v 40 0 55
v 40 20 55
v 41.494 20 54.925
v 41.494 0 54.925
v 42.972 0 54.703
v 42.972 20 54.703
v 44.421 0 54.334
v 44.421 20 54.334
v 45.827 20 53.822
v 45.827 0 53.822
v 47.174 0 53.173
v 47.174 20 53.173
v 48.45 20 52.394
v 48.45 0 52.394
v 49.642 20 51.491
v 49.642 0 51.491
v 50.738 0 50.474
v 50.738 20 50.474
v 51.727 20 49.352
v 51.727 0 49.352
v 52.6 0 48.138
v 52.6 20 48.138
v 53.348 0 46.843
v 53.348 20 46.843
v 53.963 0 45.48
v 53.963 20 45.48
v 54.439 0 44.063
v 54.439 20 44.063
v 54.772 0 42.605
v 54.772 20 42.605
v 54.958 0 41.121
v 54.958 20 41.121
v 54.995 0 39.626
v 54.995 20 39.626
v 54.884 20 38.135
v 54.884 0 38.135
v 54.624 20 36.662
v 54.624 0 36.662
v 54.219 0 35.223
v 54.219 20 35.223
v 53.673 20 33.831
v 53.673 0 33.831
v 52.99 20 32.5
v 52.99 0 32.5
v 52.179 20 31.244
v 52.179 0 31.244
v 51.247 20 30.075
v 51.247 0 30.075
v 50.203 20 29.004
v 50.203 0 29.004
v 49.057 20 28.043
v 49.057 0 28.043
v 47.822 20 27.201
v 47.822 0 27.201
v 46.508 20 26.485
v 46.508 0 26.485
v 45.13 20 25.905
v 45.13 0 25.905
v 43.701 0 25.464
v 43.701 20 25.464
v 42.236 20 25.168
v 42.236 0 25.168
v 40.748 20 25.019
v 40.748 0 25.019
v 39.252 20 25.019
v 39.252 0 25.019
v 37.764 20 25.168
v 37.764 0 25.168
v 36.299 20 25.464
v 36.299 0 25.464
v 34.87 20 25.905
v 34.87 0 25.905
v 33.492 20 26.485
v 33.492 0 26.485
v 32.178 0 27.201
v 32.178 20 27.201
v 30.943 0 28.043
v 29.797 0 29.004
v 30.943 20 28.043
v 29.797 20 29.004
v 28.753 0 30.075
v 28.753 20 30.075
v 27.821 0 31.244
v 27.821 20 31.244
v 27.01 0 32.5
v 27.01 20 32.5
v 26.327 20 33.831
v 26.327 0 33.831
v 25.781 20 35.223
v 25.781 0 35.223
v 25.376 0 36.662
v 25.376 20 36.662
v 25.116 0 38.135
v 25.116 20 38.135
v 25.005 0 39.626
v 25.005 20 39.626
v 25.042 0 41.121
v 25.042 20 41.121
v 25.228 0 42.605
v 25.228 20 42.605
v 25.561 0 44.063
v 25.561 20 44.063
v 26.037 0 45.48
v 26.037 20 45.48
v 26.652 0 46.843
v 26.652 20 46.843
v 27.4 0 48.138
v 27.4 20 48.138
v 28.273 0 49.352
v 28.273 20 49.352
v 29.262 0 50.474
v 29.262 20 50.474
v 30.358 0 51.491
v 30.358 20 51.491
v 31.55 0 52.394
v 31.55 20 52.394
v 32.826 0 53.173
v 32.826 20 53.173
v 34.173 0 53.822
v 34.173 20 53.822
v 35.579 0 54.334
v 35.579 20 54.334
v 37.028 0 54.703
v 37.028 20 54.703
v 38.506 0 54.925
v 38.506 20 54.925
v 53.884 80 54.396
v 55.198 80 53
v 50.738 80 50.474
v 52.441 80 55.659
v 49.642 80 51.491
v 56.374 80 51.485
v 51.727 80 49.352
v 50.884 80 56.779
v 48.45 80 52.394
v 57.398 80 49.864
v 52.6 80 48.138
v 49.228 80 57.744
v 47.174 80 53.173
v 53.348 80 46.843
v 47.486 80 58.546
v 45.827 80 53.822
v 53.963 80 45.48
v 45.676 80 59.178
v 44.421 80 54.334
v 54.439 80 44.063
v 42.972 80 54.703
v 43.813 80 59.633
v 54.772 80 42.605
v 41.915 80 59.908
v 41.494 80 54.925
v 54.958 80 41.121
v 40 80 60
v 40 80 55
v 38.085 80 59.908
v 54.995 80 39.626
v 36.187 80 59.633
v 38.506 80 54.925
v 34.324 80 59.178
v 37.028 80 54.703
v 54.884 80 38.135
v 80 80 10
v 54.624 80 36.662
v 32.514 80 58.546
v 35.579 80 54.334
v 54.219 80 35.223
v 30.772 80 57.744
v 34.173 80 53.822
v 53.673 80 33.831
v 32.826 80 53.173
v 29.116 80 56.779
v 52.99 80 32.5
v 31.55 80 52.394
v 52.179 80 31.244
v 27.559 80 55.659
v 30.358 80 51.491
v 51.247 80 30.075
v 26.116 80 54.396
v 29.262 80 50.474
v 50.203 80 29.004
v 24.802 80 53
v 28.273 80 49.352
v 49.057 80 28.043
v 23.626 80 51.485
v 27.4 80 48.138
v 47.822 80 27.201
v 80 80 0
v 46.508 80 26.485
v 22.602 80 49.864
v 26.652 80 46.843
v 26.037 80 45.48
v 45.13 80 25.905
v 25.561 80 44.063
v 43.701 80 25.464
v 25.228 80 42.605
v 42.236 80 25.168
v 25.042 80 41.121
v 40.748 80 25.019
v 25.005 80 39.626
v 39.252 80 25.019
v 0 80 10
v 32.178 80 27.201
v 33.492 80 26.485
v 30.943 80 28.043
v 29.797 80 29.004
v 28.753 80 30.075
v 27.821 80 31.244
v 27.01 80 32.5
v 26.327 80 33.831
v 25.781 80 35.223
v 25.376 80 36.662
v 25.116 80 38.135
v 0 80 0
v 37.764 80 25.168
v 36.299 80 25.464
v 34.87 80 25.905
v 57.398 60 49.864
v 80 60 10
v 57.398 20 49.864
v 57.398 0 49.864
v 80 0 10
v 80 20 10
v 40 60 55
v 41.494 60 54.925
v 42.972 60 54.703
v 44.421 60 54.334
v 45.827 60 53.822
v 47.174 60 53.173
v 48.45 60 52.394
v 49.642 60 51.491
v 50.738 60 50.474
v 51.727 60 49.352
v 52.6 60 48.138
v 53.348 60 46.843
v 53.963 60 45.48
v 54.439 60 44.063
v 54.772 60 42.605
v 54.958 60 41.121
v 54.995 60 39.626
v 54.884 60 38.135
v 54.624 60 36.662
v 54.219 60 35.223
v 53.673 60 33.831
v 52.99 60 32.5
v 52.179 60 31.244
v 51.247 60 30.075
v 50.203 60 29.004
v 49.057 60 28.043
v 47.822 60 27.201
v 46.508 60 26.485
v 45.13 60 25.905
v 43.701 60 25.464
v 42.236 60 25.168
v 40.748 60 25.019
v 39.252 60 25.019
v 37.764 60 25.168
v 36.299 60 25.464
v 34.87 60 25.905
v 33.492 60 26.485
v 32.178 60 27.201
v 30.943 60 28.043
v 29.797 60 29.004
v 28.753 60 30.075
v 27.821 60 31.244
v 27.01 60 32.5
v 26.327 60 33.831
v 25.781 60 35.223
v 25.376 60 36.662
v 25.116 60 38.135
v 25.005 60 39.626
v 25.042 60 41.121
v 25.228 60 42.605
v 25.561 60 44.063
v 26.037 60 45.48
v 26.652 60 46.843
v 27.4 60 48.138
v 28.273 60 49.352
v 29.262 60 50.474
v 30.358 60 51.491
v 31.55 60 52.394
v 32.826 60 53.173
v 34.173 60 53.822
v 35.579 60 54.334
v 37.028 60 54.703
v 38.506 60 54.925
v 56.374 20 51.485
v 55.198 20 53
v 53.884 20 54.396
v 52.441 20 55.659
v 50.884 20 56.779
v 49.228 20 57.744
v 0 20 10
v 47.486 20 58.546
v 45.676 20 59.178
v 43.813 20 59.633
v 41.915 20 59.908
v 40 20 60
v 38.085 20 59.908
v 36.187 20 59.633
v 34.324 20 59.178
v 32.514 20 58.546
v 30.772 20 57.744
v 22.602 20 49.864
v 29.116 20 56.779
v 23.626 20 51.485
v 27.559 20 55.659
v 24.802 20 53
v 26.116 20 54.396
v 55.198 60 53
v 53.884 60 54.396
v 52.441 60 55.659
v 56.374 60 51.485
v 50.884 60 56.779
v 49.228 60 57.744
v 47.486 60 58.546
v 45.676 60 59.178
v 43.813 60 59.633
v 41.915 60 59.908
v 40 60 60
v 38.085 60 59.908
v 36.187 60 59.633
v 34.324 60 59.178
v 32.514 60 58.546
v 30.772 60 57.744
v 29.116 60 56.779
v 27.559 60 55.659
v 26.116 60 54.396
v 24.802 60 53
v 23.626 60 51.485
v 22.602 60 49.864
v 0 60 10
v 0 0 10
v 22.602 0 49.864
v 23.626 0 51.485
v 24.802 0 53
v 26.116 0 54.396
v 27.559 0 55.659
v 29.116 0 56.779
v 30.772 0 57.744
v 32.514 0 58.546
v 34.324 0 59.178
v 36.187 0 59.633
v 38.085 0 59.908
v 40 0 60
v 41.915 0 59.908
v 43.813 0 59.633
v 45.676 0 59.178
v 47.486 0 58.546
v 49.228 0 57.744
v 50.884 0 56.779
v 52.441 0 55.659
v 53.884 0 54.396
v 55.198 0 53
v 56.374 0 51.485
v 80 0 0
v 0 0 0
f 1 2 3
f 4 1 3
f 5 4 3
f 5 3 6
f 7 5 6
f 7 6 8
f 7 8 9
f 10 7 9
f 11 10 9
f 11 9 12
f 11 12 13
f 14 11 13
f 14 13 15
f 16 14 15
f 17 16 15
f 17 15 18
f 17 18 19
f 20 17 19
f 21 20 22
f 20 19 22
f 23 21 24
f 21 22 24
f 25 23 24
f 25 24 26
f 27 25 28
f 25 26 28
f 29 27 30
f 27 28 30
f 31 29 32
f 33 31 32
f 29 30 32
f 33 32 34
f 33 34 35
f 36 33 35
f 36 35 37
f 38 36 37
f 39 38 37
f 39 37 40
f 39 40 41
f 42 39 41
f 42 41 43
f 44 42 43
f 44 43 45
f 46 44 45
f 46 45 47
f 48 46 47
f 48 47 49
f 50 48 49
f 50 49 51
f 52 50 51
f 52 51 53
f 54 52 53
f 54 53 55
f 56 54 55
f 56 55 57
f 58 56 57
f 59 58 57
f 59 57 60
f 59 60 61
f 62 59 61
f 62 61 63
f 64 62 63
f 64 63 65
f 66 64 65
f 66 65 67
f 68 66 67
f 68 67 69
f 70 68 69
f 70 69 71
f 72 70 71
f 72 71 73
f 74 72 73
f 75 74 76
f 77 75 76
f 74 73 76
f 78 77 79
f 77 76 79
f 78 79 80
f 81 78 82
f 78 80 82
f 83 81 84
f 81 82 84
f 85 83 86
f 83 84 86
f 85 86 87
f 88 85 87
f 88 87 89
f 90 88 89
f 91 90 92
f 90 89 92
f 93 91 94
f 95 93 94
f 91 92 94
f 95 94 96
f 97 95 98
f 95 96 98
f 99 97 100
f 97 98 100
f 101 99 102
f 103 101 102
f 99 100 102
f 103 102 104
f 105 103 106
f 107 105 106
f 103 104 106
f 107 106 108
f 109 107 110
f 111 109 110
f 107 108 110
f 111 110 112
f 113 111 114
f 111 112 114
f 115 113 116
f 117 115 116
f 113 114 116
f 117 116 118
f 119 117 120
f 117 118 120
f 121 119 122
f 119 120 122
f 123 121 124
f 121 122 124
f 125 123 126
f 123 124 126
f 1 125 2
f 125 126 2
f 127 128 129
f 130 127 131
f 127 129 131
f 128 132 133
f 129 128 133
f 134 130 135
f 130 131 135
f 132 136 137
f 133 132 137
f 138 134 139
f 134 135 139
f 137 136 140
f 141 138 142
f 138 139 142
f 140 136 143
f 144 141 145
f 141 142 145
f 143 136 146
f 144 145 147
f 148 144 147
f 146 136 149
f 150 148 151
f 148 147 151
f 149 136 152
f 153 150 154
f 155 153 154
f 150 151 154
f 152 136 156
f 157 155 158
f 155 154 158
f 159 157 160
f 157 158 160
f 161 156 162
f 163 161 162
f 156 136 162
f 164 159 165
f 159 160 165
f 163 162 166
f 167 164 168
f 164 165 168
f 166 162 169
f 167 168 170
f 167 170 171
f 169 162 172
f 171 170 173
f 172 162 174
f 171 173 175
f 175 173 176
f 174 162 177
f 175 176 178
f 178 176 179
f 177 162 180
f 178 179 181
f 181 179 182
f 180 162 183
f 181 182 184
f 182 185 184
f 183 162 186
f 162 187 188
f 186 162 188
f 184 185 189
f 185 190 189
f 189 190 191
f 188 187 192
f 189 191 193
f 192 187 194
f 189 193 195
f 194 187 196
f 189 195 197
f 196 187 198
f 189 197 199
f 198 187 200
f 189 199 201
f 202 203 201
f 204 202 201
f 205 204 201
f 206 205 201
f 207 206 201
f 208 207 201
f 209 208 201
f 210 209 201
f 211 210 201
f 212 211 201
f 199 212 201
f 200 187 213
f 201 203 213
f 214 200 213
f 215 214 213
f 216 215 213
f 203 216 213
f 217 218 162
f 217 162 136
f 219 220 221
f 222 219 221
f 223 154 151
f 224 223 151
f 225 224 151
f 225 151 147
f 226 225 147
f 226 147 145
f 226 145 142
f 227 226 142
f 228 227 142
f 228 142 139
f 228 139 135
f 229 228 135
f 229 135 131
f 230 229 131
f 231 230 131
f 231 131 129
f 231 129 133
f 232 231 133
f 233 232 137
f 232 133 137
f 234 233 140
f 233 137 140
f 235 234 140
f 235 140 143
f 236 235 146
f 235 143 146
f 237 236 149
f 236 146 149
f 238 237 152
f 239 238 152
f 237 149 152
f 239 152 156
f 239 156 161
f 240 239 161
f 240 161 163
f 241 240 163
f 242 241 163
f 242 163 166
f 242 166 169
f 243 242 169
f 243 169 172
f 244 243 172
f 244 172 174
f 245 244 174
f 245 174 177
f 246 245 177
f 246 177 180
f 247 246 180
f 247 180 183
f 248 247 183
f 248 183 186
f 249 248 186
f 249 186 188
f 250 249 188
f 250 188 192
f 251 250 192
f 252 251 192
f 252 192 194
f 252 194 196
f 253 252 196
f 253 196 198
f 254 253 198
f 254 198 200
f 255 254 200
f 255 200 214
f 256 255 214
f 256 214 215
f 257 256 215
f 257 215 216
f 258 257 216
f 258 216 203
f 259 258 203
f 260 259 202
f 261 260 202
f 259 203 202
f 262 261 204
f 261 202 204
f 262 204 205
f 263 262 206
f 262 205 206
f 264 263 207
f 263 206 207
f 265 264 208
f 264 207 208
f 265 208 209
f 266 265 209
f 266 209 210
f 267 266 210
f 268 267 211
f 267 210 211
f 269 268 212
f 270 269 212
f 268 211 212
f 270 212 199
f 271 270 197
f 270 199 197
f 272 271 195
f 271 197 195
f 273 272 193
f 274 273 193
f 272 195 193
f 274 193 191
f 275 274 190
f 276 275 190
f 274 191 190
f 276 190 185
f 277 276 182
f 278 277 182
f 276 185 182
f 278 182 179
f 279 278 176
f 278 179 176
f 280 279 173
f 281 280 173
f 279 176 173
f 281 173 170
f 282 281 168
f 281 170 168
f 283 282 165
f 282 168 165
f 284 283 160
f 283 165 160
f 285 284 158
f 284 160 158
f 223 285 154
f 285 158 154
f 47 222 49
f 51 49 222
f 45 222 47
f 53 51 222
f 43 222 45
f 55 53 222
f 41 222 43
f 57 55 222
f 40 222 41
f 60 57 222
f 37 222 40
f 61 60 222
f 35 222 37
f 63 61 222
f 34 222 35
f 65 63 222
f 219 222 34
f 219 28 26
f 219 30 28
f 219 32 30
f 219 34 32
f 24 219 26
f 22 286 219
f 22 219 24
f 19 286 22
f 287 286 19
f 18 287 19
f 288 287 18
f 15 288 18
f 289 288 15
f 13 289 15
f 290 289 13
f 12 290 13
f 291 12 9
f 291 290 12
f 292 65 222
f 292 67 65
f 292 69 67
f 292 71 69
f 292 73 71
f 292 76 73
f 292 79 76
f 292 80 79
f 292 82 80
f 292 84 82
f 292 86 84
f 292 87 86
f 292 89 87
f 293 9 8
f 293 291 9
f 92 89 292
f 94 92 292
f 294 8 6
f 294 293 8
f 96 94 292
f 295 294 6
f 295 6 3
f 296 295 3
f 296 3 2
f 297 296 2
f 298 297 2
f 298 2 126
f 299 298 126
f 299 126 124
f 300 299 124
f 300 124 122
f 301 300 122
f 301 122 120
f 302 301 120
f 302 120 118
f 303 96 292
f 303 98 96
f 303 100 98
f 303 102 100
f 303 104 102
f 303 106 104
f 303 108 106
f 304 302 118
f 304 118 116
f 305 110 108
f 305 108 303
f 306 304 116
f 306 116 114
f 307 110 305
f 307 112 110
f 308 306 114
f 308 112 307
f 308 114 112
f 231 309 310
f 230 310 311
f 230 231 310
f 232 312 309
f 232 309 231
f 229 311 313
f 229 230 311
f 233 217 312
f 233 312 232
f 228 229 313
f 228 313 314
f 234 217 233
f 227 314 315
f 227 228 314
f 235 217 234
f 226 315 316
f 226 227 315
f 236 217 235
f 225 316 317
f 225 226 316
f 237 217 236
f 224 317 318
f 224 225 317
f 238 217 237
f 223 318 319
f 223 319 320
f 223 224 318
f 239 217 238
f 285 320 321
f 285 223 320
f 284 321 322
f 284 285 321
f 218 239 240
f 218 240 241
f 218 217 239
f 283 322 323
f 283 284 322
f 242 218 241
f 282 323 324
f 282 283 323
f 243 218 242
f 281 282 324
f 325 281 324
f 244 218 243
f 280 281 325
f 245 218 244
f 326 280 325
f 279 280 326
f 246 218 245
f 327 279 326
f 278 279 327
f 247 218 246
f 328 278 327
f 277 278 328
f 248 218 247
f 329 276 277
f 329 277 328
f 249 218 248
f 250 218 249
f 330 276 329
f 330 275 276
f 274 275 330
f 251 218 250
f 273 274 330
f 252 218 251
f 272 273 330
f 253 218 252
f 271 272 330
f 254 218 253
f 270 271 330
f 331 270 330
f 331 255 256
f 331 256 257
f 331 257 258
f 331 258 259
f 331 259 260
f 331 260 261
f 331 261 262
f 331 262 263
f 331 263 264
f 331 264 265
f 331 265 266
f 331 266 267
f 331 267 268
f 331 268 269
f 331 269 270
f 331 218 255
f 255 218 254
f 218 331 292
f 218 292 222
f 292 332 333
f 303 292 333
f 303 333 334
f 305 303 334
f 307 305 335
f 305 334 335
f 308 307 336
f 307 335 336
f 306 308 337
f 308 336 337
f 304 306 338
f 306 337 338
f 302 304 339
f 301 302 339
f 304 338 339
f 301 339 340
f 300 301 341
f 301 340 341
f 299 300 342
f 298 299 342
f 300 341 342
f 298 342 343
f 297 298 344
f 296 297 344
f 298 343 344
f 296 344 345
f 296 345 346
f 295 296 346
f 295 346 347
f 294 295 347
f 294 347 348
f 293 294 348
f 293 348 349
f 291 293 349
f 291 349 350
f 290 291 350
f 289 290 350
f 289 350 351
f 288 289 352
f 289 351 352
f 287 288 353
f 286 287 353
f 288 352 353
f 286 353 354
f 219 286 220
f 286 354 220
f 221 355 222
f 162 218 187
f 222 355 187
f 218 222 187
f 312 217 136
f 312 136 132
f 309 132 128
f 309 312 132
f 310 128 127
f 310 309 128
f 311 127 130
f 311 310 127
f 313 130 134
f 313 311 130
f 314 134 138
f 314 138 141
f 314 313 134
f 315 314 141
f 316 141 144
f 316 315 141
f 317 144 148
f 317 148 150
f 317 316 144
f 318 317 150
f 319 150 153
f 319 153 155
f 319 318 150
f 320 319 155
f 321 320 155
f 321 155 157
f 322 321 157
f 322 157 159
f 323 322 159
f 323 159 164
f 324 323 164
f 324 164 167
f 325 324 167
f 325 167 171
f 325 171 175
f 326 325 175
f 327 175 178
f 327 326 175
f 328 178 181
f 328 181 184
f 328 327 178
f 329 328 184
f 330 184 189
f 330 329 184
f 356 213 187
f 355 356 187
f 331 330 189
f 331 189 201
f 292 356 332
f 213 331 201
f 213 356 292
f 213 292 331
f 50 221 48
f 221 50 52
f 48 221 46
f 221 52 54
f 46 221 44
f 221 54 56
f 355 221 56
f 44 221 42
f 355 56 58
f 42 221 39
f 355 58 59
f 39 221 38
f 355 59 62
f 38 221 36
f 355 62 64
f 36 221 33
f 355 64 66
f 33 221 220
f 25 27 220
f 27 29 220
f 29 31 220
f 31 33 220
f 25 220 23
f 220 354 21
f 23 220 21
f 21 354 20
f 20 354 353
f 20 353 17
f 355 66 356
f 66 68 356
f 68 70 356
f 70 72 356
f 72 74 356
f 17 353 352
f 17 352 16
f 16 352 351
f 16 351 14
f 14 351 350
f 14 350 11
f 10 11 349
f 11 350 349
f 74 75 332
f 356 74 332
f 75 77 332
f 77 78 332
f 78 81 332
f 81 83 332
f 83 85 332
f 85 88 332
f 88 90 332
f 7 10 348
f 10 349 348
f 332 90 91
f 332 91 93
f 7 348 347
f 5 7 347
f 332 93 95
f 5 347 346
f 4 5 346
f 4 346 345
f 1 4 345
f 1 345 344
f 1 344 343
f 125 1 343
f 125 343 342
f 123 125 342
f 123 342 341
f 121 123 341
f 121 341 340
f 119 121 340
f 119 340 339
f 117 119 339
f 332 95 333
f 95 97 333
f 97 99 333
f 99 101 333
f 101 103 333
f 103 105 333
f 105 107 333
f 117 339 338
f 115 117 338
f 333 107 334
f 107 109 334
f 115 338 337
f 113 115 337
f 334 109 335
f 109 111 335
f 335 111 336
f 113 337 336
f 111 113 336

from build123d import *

# Parameters (mm, degrees)
SKETCH_2_W          = 80
SKETCH_2_H          = 80
EXTRUDE_1_DEPTH     = 10
EXTRUDE_2_DEPTH     = 20
EXTRUDE_START       = -20
EXTRUDE_3_DEPTH     = 20
SKETCH_5_R          = 15
CUT_EXTRUDE_1_DEPTH = 80


with BuildPart() as part:
    # 草图2 → 凸台-拉伸1 (new body)
    with BuildSketch(Plane.XY):
        with Locations((40, 40)):
            Rectangle(SKETCH_2_W, SKETCH_2_H)
    extrude(amount=EXTRUDE_1_DEPTH)

    # 草图3 → 凸台-拉伸2 (add)
    with BuildSketch(Plane.XZ):
        with BuildLine():
            Line((0, 10), (22.601818332, 49.864242224))
            ThreePointArc((22.601818332, 49.864242224), (40, 60), (57.398181668, 49.864242224))
            Line((57.398181668, 49.864242224), (80, 10))
            Line((80, 10), (0, 10))
        make_face()
    extrude(amount=-EXTRUDE_2_DEPTH)

    # 草图4 → 凸台-拉伸3 (add)
    with BuildSketch(Plane(origin=(0, 80, 0), x_dir=(1, 0, 0), z_dir=(0, 1, 0)).offset(EXTRUDE_START)):
        with BuildLine():
            Line((80, -10), (57.398181668, -49.864242224))
            ThreePointArc((57.398181668, -49.864242224), (40, -60), (22.601818332, -49.864242224))
            Line((22.601818332, -49.864242224), (0, -10))
            Line((0, -10), (80, -10))
        make_face()
    extrude(amount=EXTRUDE_3_DEPTH)

    # 草图5 → 切除-拉伸1 (cut)
    with BuildSketch(Plane(origin=(0, 80, 0), x_dir=(1, 0, 0), z_dir=(0, 1, 0))):
        with Locations(Location((40, -40, 0), (0, 0, 270))):
            Circle(SKETCH_5_R)
    extrude(amount=-CUT_EXTRUDE_1_DEPTH, mode=Mode.SUBTRACT)


solid = part.part
